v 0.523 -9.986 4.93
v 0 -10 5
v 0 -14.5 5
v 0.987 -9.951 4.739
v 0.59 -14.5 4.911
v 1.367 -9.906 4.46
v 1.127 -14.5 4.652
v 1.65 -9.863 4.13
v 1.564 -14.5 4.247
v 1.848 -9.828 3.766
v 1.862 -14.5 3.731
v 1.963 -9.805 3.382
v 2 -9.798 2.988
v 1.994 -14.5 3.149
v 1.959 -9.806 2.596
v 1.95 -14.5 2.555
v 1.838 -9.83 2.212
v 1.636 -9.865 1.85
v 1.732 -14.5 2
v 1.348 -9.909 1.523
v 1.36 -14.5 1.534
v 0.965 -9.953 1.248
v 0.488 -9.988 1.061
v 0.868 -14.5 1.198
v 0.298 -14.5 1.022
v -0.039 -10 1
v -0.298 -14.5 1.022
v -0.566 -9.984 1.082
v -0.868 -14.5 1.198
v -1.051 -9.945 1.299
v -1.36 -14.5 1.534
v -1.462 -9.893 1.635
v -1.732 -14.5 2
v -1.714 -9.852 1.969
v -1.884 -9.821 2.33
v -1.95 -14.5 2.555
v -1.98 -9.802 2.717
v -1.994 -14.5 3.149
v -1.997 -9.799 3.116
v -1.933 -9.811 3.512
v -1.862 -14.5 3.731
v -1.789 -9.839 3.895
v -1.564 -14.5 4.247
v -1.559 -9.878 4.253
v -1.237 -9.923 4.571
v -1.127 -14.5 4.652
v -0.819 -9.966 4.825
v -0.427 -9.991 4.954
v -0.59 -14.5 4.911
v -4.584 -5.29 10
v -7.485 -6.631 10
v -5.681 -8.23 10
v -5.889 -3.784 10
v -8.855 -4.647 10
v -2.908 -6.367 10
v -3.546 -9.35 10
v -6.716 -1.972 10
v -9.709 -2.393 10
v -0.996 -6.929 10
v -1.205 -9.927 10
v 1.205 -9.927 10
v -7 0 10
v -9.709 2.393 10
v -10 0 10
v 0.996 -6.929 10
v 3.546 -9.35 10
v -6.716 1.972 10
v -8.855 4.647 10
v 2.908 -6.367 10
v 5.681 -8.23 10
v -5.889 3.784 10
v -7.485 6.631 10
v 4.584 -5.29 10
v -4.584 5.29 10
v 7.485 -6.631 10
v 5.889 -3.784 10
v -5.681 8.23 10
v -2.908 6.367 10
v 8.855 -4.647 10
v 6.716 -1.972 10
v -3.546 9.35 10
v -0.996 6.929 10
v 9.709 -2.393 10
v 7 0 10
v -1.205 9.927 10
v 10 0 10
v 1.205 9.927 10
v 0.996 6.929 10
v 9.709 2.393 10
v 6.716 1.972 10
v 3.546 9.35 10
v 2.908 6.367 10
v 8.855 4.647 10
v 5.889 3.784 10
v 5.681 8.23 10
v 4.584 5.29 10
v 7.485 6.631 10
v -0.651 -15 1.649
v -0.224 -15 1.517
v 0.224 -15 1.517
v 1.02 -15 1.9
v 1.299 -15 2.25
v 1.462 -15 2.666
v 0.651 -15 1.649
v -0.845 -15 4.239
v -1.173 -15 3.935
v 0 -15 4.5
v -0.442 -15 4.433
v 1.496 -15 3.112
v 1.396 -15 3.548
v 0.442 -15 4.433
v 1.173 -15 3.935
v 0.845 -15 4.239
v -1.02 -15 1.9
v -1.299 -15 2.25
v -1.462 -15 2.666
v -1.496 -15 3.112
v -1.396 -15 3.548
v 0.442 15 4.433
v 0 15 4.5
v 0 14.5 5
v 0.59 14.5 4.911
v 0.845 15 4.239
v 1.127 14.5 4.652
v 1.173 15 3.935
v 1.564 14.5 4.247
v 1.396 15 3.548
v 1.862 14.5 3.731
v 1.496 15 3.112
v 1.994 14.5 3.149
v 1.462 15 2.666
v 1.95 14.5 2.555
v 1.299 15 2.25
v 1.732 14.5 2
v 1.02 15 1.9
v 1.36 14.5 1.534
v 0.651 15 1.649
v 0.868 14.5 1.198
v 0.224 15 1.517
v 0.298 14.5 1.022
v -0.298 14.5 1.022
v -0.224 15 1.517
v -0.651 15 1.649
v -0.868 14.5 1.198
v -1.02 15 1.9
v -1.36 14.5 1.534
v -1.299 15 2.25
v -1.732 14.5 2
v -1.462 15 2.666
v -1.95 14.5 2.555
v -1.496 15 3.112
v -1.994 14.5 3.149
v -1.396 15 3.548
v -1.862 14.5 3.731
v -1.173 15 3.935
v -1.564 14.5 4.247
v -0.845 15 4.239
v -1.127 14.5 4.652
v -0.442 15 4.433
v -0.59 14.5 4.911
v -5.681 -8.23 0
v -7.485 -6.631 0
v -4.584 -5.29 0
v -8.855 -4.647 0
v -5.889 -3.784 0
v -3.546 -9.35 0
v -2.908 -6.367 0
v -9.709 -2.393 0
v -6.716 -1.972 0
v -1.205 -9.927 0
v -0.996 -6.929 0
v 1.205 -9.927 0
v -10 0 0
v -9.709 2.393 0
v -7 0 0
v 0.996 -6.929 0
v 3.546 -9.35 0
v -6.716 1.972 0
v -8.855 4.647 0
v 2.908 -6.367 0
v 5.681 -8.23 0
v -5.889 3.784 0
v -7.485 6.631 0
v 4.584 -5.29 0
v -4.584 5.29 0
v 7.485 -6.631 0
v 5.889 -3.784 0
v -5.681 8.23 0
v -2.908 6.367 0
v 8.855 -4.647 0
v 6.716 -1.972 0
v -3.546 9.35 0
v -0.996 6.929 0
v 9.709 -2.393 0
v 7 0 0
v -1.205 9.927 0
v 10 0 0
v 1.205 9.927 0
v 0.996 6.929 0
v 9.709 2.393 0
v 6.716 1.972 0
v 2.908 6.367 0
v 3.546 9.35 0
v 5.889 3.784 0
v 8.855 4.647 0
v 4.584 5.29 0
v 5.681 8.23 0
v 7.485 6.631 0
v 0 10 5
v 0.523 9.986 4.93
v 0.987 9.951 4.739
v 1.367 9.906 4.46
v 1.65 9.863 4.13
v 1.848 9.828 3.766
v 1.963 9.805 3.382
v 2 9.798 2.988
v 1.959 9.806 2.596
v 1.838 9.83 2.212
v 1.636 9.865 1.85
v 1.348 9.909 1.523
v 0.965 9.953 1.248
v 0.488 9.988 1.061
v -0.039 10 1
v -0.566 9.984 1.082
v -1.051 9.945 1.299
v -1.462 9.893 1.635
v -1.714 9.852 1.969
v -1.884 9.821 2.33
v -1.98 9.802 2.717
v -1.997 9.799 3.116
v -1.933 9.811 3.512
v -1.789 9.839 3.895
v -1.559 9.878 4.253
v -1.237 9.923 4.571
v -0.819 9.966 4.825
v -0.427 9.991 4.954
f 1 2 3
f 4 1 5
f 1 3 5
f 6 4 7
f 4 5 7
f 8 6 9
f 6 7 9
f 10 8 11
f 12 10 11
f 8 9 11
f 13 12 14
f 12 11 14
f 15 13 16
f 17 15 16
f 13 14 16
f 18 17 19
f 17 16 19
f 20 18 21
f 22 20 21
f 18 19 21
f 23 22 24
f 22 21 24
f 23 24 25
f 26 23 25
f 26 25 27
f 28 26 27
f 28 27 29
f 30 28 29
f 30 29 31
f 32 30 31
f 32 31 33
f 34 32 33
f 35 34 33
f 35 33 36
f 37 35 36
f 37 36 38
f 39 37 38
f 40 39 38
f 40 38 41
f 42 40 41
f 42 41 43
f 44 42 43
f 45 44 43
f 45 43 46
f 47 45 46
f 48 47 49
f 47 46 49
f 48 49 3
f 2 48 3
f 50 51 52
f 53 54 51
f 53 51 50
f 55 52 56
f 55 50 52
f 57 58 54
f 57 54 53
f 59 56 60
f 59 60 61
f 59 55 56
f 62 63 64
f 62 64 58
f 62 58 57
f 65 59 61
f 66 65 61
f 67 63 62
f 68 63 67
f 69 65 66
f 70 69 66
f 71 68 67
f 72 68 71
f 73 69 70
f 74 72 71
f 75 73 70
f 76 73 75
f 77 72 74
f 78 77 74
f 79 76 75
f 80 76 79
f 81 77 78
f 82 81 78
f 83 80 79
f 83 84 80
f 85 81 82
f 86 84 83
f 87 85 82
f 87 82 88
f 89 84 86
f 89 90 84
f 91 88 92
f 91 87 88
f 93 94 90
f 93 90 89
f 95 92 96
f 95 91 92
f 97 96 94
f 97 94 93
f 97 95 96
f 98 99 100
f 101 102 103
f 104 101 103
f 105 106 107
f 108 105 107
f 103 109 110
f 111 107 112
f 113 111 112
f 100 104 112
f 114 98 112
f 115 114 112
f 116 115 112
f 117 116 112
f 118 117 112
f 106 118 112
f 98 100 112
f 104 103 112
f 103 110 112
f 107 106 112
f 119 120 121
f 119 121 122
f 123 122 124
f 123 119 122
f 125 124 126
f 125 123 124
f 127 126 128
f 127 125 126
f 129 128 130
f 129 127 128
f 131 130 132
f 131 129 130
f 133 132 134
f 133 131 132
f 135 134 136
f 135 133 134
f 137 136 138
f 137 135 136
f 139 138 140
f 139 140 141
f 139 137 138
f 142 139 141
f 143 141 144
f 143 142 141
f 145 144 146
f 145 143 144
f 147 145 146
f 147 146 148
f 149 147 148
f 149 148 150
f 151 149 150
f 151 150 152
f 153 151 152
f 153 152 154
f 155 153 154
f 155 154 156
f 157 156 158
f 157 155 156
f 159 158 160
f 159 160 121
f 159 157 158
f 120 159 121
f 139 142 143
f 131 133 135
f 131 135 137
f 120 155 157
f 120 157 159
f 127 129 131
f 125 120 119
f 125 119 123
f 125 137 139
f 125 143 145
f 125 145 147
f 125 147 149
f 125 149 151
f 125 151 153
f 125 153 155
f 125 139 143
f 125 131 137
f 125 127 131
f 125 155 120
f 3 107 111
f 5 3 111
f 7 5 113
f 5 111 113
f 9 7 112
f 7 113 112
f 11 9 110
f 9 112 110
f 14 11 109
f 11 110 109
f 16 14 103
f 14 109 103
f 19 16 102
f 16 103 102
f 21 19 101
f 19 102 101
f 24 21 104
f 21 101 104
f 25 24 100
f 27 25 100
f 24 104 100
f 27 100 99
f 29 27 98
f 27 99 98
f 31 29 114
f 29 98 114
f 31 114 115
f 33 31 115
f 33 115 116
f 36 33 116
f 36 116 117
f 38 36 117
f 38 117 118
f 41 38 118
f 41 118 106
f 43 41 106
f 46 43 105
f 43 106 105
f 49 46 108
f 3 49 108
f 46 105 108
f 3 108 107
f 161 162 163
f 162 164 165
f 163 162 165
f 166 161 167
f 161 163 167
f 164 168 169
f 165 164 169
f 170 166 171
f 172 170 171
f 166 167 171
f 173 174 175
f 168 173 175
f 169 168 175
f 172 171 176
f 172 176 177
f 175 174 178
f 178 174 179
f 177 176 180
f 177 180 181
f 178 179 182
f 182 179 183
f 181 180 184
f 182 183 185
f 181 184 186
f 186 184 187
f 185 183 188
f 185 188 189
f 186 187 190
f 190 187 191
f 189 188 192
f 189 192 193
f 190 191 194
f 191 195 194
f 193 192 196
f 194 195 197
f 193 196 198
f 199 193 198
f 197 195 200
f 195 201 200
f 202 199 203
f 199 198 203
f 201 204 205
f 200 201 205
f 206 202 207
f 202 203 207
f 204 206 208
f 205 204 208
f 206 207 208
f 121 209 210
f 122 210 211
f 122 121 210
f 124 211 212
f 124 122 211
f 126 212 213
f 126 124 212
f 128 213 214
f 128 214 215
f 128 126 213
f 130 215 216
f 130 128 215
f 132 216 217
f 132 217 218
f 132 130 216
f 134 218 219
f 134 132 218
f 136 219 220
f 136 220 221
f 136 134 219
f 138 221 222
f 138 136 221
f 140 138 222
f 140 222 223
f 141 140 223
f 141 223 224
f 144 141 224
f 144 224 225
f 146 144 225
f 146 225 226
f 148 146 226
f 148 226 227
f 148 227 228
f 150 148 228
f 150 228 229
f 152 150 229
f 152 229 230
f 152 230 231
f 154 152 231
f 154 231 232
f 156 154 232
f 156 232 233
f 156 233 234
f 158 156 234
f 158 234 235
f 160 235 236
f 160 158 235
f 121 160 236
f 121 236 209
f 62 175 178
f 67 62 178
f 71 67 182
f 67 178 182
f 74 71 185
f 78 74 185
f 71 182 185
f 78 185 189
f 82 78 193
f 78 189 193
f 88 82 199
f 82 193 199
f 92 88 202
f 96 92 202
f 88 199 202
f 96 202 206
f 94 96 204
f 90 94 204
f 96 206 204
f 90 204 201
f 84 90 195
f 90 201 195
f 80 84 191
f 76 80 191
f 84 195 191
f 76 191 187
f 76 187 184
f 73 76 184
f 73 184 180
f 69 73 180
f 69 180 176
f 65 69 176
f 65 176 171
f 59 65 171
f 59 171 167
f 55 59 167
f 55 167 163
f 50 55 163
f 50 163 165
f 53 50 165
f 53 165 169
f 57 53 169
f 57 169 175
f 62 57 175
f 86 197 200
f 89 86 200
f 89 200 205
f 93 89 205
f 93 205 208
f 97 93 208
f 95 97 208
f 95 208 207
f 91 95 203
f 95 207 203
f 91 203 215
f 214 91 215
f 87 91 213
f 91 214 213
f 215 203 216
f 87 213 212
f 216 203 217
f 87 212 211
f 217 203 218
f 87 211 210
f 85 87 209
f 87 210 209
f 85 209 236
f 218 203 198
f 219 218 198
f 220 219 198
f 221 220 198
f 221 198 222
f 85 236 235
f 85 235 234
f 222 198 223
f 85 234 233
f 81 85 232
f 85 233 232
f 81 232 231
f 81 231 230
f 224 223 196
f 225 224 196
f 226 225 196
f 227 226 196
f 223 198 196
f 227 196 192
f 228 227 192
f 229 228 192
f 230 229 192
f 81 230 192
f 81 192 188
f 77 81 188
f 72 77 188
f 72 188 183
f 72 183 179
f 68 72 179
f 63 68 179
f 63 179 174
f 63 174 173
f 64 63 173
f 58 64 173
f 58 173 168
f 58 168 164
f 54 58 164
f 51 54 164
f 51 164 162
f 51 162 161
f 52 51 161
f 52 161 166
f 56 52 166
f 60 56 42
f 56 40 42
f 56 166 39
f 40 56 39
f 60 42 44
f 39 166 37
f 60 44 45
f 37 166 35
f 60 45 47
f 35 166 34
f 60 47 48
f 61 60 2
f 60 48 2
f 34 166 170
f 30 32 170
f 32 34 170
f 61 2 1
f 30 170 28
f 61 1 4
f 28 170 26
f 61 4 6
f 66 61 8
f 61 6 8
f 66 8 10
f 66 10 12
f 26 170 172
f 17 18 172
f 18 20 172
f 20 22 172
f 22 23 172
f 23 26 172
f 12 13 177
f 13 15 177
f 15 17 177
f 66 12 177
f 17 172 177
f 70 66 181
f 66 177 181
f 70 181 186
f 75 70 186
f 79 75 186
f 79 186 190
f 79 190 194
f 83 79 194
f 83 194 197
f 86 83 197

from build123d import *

# Parameters (mm, degrees)
SKETCH1_R                = 10
BOSS_EXTRUDE1_DEPTH      = 10
SKETCH2_R                = 7
CUT_EXTRUDE1_DEPTH       = 18.320508076
BOSS_EXTRUDE3_REACH      = 30.723
BOSS_EXTRUDE3_END_RADIUS = 10
SKETCH4_R                = 2
CHAMFER2_SIZE            = 0.5


with BuildPart() as part:
    # Sketch1 → Boss-Extrude1 (new body)
    with BuildSketch(Plane.XY):
        Circle(SKETCH1_R)
    extrude(amount=BOSS_EXTRUDE1_DEPTH)

    # Sketch2 → Cut-Extrude1 (cut, through all)
    with BuildSketch(Plane(origin=(0, 0, 0), x_dir=(-1, 0, 0), z_dir=(0, 0, -1))):
        Circle(SKETCH2_R)
    extrude(amount=-CUT_EXTRUDE1_DEPTH, mode=Mode.SUBTRACT)

    # Boss-Extrude3: up to this cylinder (the profile starts outside it)
    boss_extrude3_end = Plane(origin=(0, 0, 3), z_dir=(0, 0, -1)) * Cylinder(BOSS_EXTRUDE3_END_RADIUS, 82.446, mode=Mode.PRIVATE)
    # Sketch4 → Boss-Extrude3 (add, up to the surface)
    with BuildSketch(Plane(origin=(0, 15, 0), x_dir=(1, 0, 0), z_dir=(0, 1, 0)), mode=Mode.PRIVATE) as boss_extrude3_sk1:
        with Locations(Location((0, -3, 0), (0, 0, 270))):
            Circle(SKETCH4_R)
    boss_extrude3_tool1 = extrude(boss_extrude3_sk1.sketch, amount=-BOSS_EXTRUDE3_REACH, mode=Mode.PRIVATE) - boss_extrude3_end
    boss_extrude3 = boss_extrude3_tool1.solids().sort_by_distance((0, 15, 3))[0]
    add(boss_extrude3)

    # Mirror2: Boss-Extrude3 across plane
    add(boss_extrude3.mirror(Plane.ZX))

    # Chamfer2
    chamfer2_edges = [part.edges().sort_by_distance(p)[0] for p in [
        (0, 15, 1),
        (0, -15, 1),
    ]]
    chamfer(chamfer2_edges, length=CHAMFER2_SIZE)


solid = part.part
